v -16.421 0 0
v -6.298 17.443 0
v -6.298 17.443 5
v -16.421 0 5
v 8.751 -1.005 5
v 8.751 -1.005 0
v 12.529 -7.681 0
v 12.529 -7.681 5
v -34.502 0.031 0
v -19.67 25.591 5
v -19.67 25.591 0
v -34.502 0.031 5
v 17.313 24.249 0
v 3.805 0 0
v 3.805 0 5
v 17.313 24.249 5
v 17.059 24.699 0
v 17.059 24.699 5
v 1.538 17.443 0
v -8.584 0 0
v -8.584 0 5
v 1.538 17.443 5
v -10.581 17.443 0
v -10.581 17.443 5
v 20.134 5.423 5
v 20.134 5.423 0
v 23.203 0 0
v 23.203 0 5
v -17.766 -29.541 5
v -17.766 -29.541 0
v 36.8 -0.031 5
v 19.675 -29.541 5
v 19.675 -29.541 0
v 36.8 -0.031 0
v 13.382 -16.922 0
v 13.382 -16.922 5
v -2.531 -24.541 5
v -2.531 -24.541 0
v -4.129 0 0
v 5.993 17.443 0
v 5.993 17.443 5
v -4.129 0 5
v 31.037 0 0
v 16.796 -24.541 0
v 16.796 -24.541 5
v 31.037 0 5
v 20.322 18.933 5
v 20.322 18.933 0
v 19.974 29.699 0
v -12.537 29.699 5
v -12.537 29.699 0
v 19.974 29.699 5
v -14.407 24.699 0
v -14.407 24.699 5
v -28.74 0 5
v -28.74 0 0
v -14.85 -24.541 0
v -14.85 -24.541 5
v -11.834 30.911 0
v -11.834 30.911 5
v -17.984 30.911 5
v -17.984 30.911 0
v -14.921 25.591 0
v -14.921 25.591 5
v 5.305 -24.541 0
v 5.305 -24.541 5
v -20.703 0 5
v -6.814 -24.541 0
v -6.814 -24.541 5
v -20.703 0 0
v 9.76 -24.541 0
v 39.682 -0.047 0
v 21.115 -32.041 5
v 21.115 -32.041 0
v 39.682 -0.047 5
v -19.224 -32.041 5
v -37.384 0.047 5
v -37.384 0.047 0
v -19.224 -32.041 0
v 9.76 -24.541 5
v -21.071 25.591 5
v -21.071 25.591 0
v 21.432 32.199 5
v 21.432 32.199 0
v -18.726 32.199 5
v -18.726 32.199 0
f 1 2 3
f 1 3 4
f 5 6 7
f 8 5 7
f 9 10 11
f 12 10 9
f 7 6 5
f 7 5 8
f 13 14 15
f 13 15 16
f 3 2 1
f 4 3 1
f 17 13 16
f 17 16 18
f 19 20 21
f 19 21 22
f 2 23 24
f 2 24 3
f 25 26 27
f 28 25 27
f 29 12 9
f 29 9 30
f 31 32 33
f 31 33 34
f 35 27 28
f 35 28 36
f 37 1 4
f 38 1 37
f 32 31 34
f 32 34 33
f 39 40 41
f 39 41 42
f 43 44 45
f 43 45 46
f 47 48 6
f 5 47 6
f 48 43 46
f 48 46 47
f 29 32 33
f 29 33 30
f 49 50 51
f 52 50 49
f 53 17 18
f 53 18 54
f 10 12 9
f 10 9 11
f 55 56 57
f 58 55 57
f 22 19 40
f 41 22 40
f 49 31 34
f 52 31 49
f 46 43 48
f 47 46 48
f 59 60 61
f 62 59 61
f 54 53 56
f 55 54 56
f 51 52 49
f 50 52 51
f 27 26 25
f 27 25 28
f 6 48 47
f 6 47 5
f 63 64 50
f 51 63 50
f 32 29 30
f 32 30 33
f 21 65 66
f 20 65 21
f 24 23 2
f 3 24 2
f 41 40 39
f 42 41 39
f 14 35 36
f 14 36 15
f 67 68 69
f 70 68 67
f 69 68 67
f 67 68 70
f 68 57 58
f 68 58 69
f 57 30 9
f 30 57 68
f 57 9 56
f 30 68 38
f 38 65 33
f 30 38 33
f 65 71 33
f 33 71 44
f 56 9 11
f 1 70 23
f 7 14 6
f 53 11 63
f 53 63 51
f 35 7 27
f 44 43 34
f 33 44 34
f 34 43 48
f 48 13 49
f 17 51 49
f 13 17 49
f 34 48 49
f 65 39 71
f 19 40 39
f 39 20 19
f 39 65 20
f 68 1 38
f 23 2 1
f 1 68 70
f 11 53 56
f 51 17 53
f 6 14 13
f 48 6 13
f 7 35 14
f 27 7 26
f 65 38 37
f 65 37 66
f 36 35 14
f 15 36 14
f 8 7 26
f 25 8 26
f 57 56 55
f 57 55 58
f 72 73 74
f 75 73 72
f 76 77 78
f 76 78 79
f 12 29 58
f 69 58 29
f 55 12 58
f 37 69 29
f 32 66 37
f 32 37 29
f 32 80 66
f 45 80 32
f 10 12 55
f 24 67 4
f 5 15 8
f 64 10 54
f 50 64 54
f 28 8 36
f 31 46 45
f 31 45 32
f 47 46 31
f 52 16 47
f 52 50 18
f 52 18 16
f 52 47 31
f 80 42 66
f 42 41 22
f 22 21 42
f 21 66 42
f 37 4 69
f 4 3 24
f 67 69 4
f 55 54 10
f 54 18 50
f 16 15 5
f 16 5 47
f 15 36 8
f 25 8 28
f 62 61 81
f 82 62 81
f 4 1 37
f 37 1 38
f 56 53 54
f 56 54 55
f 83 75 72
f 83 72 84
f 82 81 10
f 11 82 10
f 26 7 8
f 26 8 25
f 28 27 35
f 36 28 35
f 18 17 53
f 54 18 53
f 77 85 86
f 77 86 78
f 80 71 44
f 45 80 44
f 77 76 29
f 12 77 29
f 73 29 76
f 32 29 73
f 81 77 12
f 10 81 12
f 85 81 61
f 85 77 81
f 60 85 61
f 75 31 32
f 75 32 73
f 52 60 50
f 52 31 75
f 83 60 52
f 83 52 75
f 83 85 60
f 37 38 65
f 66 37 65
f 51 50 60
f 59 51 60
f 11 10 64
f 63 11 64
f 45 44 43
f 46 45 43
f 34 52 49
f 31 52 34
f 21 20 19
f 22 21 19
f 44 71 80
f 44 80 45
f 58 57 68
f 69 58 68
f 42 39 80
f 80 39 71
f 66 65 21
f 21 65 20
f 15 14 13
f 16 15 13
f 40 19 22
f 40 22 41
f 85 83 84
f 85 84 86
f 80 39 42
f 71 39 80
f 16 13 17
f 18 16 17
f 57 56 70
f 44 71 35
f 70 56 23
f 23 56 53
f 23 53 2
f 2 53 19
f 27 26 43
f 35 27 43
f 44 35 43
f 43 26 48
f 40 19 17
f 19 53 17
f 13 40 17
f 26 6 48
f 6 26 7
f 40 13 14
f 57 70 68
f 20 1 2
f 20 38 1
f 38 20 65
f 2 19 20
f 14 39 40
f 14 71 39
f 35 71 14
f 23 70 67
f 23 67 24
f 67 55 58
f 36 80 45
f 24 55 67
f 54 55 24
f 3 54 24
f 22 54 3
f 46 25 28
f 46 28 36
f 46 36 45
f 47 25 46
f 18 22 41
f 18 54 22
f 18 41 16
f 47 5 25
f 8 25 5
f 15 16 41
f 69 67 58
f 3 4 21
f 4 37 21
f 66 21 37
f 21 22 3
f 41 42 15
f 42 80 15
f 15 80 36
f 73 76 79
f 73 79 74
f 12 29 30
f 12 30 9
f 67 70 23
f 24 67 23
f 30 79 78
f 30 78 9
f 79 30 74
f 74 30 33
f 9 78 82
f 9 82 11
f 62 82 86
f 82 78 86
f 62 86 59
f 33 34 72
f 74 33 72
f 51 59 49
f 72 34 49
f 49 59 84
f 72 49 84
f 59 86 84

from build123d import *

# Parameters (mm, degrees)
F1_DEPTH  = 5
F3_DEPTH  = 5
F6_DEPTH  = 5
F8_DEPTH  = 25
F10_DEPTH = 25


# Not quite as in the source:
# - a feature names something its author has since deleted; it is built from what else it names


with BuildPart() as f1:
    # F0 (on Top) → F1 (new body)
    with BuildSketch(Plane.XY):
        Polygon((9.7598956231, -24.5410669595), (16.7959537357, -24.5410669595), (31.0372654349, 0), (20.3218720853, 18.9331807196), (8.7514274241, -1.0053658961), (12.5294908801, -7.6808798833), (20.1335282104, 5.4226314524), (23.2025122265, 0), (13.3824004213, -16.922319127), (3.8050711538, 0), (17.3130770462, 24.2494634137), (17.0587887483, 24.6987690194), (-14.4067760557, 24.6987690194), (-28.7396030991, 0), (-14.8503792237, -24.5410669595), (-6.8139773794, -24.5410669595), (-20.7032012548, 0), (-10.5808662515, 17.4431194507), (-6.2982602976, 17.4431194507), (-16.4205953009, 0), (-2.5313714255, -24.5410669595), (5.3053838201, -24.5410669595), (-8.5838400553, 0), (1.538494948, 17.4431194507), (5.9930067509, 17.4431194507), (-4.1293282523, 0), align=None)
    extrude(amount=F1_DEPTH)


with BuildPart() as f3:
    # F2 (on face) → F3 (new body)
    with BuildSketch(Plane.XY.offset(5)):
        Polygon((19.9742314443, 29.6987690194), (-17.2861539376, 29.6987690194), (-34.5024495524, 0.0311181456), (-17.7658219197, -29.5410669595), (19.6753316176, -29.5410669595), (36.8001118881, -0.0311181456), align=None)
    extrude(amount=-F3_DEPTH)

    # F4: cut F1
    add(f1.part, mode=Mode.SUBTRACT)

    # F7 (on face) → F8 (cut)
    with BuildSketch(Plane.XY.offset(5)):
        Polygon((-14.9207130098, 25.5912134556), (-12.5370766665, 29.6987690194), (-17.2861539376, 29.6987690194), (-19.6697902808, 25.5912134556), align=None)
    extrude(amount=-F8_DEPTH, mode=Mode.SUBTRACT)


with BuildPart() as f6:
    # F5 (on face) → F6 (new body, through all)
    with BuildSketch(Plane.XY.offset(5)):
        Polygon((21.4319527923, 32.1987690194), (-18.7258428786, 32.1987690194), (-37.383872779, 0.0466772184), (-19.2235432677, -32.0410669595), (21.1150205586, -32.0410669595), (39.6815351148, -0.0466772184), align=None)
        Polygon((-34.5024495524, 0.0311181456), (-17.2861539376, 29.6987690194), (19.9742314443, 29.6987690194), (36.8001118881, -0.0311181456), (19.6753316176, -29.5410669595), (-17.7658219197, -29.5410669595), align=None, mode=Mode.SUBTRACT)
    extrude(amount=-F6_DEPTH)

    # F9 (on face) → F10 (cut)
    with BuildSketch(Plane.XY.offset(5)):
        Polygon((-21.071260795, 25.5912134556), (-19.6697902808, 25.5912134556), (-14.9207130098, 25.5912134556), (-12.5370766665, 29.6987690194), (-11.8336566418, 30.9109240717), (-17.984204427, 30.9109240717), align=None)
    extrude(amount=-F10_DEPTH, mode=Mode.SUBTRACT)


solid = Compound([f1.part, f3.part, f6.part])
